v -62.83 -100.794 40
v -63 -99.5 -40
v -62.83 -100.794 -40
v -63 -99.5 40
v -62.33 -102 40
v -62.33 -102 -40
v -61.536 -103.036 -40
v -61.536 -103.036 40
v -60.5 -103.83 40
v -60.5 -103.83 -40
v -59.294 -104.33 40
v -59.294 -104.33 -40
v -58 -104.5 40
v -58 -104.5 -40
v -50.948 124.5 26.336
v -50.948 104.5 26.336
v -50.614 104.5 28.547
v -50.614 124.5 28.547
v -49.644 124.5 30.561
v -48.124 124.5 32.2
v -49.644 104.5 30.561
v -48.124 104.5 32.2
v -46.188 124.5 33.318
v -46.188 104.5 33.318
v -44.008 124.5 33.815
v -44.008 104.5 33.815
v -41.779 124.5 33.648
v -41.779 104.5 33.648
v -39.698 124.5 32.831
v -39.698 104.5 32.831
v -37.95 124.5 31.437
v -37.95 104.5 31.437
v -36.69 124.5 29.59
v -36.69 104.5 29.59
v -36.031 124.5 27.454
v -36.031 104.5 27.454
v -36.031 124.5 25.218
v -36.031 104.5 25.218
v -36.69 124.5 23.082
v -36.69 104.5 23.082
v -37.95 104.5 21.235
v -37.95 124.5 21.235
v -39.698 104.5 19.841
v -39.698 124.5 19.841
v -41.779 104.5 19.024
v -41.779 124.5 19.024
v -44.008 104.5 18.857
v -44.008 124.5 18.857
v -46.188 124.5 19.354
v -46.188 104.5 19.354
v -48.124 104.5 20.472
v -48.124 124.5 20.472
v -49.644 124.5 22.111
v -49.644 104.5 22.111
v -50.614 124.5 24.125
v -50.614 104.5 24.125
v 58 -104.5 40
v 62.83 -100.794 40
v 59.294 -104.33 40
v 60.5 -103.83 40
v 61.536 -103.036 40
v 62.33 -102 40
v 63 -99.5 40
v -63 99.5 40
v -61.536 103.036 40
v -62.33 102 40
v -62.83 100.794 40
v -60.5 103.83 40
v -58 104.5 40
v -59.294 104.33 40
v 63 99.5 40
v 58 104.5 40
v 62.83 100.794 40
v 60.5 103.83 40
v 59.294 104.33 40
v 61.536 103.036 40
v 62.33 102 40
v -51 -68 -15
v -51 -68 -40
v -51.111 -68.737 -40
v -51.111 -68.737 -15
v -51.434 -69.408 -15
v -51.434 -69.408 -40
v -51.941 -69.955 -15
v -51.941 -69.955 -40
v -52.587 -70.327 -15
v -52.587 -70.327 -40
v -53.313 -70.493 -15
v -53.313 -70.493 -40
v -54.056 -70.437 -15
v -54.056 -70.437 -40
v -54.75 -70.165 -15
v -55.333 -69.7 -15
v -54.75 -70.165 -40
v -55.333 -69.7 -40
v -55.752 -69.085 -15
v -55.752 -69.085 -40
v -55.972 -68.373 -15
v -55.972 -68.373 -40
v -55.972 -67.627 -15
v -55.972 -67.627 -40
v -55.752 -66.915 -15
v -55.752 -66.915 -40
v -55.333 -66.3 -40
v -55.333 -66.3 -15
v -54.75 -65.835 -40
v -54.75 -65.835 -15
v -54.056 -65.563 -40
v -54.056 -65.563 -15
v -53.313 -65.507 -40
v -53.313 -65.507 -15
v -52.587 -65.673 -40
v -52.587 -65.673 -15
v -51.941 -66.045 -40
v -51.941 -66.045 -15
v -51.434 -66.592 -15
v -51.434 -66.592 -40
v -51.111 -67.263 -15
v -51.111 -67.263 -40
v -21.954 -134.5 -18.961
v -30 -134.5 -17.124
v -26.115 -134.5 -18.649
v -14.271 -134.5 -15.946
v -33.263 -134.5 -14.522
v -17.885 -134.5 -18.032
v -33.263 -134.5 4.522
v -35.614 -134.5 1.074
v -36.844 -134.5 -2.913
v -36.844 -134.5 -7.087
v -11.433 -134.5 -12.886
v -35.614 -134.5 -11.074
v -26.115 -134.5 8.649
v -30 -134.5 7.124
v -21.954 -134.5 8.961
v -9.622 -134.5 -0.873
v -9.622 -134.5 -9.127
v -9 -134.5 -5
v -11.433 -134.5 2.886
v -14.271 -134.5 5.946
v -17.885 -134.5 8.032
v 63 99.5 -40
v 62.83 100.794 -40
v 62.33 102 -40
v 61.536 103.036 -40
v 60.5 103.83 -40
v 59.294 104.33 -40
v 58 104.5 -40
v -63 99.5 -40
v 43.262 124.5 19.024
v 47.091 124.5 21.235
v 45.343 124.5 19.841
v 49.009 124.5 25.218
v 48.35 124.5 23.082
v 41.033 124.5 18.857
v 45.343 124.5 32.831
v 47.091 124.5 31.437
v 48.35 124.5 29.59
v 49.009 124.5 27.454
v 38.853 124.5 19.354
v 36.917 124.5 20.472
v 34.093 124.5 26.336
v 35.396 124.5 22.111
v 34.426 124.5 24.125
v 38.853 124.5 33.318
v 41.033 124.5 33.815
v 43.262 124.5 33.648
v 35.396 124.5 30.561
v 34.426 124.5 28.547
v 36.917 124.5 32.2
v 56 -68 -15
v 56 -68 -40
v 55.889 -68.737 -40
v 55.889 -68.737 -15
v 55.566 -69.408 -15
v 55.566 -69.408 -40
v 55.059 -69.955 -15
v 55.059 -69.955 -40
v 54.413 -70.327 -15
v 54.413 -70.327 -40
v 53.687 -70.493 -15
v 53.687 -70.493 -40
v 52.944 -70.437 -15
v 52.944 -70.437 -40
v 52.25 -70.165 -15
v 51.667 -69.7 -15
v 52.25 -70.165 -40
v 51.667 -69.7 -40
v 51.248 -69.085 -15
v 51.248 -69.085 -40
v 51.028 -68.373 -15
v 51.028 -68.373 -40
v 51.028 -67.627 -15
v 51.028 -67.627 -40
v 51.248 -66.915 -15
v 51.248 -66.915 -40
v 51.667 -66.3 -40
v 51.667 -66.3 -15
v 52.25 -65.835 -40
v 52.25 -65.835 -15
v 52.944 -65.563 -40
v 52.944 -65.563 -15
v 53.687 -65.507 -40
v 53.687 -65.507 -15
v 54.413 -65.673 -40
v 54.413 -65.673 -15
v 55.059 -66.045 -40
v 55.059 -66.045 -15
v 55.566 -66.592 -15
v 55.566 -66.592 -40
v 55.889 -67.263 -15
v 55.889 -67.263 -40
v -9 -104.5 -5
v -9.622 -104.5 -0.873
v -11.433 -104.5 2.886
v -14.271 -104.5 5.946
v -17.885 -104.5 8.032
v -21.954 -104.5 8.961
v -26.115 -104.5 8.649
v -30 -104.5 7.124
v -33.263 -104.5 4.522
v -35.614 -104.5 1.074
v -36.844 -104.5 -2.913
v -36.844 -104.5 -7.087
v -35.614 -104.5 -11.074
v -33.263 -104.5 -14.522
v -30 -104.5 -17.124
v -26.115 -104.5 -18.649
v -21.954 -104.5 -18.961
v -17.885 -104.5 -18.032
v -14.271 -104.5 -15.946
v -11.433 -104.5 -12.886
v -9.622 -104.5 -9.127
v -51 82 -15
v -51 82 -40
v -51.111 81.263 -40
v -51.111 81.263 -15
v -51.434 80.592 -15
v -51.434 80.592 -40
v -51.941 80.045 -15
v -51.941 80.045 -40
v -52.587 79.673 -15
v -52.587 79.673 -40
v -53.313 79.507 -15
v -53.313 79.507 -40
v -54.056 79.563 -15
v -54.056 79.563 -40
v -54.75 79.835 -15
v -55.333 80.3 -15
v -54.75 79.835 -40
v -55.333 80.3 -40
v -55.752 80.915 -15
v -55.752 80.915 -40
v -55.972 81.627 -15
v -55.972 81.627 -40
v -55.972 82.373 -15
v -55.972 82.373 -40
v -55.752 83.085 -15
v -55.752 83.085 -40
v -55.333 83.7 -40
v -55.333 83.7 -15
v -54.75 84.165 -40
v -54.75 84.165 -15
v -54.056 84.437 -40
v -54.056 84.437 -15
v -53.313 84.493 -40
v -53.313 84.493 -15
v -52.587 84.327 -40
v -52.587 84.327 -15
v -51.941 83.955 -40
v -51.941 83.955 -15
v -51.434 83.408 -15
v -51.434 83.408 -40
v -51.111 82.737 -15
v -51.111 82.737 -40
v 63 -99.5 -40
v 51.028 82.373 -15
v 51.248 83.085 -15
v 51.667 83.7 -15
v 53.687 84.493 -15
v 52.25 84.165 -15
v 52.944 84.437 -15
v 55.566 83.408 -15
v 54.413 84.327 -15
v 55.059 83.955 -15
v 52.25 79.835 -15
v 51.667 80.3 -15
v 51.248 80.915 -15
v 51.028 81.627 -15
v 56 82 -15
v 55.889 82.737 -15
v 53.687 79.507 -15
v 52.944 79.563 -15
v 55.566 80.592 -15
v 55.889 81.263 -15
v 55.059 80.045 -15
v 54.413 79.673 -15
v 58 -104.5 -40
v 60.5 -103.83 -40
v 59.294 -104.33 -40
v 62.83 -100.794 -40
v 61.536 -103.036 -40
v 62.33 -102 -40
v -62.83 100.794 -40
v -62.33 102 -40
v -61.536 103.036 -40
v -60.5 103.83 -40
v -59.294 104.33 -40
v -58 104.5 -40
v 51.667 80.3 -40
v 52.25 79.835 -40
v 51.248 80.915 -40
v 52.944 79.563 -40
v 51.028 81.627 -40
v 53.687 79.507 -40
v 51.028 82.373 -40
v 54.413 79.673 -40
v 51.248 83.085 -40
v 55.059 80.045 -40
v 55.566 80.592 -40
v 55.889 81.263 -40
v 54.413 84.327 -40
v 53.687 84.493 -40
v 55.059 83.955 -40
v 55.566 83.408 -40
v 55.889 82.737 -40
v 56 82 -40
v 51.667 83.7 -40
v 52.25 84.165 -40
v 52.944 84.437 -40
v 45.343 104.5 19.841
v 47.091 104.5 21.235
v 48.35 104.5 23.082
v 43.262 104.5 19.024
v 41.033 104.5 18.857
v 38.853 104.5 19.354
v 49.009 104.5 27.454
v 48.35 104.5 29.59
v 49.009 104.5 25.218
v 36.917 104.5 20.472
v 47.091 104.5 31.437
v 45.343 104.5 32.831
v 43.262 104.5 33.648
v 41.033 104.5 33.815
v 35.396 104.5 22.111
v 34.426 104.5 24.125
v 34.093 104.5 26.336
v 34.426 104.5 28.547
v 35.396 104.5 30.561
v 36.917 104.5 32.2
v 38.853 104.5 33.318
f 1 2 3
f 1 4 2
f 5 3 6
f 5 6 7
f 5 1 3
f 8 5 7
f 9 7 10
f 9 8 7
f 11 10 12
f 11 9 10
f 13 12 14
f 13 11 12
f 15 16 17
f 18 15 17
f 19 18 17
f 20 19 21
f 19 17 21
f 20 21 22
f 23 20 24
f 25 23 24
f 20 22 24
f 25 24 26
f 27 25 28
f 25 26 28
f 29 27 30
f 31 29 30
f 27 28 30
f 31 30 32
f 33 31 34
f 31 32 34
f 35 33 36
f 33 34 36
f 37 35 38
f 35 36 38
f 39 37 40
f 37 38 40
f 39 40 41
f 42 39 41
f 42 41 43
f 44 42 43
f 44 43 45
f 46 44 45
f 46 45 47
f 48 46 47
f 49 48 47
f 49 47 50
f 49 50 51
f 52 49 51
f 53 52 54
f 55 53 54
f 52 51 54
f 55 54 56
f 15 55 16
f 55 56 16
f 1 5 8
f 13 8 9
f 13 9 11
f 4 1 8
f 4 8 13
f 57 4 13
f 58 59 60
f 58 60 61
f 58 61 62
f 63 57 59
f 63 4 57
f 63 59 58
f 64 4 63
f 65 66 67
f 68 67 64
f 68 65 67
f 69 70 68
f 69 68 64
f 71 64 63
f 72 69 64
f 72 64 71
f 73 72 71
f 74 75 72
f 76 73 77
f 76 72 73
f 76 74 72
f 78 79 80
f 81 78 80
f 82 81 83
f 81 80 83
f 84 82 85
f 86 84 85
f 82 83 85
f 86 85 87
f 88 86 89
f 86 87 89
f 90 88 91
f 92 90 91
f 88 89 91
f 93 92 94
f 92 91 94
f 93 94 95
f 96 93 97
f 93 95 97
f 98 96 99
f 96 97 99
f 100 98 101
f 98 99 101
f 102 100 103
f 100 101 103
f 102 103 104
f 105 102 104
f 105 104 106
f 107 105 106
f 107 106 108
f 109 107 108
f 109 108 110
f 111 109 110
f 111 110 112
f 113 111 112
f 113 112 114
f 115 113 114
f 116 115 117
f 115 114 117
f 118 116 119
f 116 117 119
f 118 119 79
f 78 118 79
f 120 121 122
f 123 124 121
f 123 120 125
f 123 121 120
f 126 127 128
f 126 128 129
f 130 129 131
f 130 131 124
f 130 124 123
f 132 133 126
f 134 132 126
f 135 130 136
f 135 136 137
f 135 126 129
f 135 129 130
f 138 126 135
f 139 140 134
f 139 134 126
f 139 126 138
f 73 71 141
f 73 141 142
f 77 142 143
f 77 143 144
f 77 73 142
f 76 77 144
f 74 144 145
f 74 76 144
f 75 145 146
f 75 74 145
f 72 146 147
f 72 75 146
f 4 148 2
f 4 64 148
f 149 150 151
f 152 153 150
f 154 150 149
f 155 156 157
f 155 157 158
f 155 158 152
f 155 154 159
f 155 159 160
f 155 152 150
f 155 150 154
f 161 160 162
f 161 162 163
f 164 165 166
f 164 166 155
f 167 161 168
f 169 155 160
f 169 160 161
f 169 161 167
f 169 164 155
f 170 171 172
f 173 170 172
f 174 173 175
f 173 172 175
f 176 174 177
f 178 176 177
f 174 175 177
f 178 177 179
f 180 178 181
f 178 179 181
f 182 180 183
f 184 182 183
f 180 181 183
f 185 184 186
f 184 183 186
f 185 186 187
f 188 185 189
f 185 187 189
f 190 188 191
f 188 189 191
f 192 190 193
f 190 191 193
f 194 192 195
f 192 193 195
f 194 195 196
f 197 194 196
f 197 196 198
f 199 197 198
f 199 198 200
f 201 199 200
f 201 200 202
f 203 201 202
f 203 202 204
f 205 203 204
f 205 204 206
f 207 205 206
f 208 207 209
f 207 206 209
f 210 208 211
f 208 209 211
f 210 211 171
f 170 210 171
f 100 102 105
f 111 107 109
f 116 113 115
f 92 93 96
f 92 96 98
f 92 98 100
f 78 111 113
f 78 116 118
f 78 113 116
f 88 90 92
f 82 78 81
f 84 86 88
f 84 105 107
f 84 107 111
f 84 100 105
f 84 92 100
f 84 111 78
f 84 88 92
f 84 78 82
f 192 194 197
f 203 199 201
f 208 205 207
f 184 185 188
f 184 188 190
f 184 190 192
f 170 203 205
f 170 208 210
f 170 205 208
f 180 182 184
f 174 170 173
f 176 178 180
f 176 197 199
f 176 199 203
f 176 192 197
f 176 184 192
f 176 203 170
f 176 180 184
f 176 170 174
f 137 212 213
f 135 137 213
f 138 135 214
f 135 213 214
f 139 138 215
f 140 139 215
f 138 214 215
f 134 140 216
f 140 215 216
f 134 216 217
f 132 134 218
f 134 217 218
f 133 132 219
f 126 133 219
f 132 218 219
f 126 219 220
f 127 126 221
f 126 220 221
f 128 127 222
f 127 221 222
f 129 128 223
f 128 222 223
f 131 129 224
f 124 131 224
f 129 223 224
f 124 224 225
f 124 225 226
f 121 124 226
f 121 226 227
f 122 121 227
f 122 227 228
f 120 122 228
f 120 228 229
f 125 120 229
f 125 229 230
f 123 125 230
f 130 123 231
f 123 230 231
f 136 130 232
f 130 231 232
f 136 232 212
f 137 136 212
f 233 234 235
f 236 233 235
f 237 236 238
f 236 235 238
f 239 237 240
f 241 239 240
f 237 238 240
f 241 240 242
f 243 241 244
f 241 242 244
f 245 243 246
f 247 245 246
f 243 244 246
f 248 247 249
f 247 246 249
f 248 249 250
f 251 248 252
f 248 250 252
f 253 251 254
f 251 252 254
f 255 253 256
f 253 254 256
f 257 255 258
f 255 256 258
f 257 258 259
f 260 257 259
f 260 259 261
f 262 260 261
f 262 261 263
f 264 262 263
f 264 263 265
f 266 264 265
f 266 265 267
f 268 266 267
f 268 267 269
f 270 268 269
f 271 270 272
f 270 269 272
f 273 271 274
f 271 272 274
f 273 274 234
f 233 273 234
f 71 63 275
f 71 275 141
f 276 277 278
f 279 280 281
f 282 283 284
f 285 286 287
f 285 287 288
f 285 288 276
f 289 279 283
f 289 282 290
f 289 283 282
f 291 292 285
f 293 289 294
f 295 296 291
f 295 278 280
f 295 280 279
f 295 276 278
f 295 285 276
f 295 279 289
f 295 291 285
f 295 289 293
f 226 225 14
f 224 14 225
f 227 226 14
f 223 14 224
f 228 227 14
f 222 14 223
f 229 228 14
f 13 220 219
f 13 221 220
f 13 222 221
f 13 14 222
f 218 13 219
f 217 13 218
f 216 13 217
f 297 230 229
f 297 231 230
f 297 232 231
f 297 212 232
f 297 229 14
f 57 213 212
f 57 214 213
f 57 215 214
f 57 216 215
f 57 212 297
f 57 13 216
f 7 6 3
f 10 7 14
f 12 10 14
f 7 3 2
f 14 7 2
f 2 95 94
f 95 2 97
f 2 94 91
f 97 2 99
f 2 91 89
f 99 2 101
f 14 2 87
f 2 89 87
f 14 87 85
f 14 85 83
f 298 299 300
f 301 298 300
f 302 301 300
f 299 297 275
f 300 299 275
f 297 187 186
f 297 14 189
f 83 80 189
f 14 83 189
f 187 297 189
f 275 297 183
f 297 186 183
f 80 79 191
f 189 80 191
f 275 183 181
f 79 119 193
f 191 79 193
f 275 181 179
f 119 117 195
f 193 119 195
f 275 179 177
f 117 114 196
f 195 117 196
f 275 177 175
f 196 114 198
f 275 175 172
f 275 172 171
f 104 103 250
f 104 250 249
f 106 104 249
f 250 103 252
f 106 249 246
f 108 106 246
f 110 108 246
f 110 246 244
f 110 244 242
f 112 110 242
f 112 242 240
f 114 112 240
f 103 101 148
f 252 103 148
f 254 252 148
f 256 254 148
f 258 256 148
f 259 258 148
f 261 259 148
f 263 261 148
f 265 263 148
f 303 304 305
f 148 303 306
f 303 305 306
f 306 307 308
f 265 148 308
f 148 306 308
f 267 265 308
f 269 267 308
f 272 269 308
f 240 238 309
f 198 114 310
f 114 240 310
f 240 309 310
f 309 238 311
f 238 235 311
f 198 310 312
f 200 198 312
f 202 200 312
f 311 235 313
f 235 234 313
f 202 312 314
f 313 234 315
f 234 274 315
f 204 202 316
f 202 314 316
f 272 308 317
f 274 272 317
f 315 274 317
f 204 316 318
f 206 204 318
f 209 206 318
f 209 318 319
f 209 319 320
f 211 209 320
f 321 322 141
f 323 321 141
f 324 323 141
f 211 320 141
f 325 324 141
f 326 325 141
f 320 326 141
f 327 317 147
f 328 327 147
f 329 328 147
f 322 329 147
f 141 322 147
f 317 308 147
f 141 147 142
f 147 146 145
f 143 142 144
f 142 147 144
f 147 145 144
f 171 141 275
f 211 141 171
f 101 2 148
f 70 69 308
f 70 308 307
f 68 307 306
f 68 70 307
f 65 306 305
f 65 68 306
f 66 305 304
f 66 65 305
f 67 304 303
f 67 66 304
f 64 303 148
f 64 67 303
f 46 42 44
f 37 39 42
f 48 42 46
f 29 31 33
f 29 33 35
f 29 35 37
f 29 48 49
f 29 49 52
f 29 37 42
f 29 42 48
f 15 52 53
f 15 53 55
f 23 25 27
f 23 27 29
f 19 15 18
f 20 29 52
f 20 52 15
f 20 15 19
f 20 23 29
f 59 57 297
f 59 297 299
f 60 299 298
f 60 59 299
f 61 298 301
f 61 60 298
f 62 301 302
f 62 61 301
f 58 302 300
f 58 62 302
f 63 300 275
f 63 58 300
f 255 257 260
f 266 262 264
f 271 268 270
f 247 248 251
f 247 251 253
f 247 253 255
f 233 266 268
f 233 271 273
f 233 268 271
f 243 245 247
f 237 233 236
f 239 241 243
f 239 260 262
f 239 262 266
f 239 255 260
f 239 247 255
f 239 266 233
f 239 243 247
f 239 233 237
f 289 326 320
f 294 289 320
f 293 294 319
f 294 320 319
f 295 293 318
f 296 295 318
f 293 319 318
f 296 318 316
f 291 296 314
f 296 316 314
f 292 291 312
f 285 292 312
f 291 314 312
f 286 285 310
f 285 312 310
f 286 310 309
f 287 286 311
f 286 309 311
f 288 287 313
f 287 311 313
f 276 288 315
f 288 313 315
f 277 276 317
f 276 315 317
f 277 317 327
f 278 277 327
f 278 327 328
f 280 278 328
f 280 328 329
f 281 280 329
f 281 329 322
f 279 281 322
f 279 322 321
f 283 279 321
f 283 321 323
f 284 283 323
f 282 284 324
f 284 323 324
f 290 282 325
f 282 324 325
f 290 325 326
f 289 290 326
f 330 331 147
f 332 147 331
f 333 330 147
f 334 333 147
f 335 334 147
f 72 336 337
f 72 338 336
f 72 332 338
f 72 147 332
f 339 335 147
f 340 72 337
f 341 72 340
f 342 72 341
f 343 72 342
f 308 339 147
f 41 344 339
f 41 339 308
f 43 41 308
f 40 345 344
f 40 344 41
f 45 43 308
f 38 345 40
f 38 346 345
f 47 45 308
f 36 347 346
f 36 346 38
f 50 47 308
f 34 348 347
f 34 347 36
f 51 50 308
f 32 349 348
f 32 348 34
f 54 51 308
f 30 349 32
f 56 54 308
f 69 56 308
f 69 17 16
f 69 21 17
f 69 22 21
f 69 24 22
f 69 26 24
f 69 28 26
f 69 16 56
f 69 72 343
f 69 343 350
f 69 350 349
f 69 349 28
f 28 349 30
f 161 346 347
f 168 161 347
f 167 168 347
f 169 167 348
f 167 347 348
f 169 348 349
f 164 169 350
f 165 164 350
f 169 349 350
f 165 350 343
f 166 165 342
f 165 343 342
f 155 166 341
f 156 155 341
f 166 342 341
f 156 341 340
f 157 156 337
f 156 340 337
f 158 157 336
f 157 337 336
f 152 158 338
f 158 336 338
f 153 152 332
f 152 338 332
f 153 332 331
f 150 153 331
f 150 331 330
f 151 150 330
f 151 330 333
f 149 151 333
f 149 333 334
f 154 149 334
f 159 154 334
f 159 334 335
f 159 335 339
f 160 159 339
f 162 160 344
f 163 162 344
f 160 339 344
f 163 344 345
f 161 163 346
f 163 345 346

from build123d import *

# Parameters (mm, degrees)
F1_DEPTH = 40
F2_R     = 2.5
F3_DEPTH = 25
F4_R     = 14
F5_DEPTH = 30
F6_R     = 7.5
F7_DEPTH = 20


with BuildPart() as f1:
    # F0 (on Top) → F1 (new body, symmetric)
    with BuildSketch(Plane.XY):
        with BuildLine():
            Line((-58, -104.5), (58, -104.5))
            ThreePointArc((58, -104.5), (61.5355339059, -103.0355339059), (63, -99.5))
            Line((63, -99.5), (63, 99.5))
            ThreePointArc((63, 99.5), (61.5355339059, 103.0355339059), (58, 104.5))
            Line((58, 104.5), (-58, 104.5))
            ThreePointArc((-58, 104.5), (-61.5355339059, 103.0355339059), (-63, 99.5))
            Line((-63, 99.5), (-63, -99.5))
            ThreePointArc((-63, -99.5), (-61.5355339059, -103.0355339059), (-58, -104.5))
        make_face()
    extrude(amount=F1_DEPTH, both=True)

    # F2 (on face) → F3 (cut)
    with BuildSketch(Plane(origin=(0, 0, -40), x_dir=(1, 0, 0), z_dir=(0, 0, -1))):
        with Locations((-53.5, -82)):
            Circle(F2_R)
        with Locations((53.5, -82)):
            Circle(F2_R)
        with Locations((-53.5, 68)):
            Circle(F2_R)
        with Locations((53.5, 68)):
            Circle(F2_R)
    extrude(amount=-F3_DEPTH, mode=Mode.SUBTRACT)

    # F4 (on face) → F5 (join)
    with BuildSketch(Plane.XZ.offset(104.5)):
        with Locations((-23, -5)):
            Circle(F4_R)
    extrude(amount=F5_DEPTH)

    # F6 (on face) → F7 (join)
    with BuildSketch(Plane(origin=(0, 104.5, 0), x_dir=(-1, 0, 0), z_dir=(0, 1, 0))):
        with Locations((-41.5932163596, 26.335991919)):
            Circle(F6_R)
        with Locations((43.447509408, 26.335991919)):
            Circle(F6_R)
    extrude(amount=F7_DEPTH)


solid = f1.part
